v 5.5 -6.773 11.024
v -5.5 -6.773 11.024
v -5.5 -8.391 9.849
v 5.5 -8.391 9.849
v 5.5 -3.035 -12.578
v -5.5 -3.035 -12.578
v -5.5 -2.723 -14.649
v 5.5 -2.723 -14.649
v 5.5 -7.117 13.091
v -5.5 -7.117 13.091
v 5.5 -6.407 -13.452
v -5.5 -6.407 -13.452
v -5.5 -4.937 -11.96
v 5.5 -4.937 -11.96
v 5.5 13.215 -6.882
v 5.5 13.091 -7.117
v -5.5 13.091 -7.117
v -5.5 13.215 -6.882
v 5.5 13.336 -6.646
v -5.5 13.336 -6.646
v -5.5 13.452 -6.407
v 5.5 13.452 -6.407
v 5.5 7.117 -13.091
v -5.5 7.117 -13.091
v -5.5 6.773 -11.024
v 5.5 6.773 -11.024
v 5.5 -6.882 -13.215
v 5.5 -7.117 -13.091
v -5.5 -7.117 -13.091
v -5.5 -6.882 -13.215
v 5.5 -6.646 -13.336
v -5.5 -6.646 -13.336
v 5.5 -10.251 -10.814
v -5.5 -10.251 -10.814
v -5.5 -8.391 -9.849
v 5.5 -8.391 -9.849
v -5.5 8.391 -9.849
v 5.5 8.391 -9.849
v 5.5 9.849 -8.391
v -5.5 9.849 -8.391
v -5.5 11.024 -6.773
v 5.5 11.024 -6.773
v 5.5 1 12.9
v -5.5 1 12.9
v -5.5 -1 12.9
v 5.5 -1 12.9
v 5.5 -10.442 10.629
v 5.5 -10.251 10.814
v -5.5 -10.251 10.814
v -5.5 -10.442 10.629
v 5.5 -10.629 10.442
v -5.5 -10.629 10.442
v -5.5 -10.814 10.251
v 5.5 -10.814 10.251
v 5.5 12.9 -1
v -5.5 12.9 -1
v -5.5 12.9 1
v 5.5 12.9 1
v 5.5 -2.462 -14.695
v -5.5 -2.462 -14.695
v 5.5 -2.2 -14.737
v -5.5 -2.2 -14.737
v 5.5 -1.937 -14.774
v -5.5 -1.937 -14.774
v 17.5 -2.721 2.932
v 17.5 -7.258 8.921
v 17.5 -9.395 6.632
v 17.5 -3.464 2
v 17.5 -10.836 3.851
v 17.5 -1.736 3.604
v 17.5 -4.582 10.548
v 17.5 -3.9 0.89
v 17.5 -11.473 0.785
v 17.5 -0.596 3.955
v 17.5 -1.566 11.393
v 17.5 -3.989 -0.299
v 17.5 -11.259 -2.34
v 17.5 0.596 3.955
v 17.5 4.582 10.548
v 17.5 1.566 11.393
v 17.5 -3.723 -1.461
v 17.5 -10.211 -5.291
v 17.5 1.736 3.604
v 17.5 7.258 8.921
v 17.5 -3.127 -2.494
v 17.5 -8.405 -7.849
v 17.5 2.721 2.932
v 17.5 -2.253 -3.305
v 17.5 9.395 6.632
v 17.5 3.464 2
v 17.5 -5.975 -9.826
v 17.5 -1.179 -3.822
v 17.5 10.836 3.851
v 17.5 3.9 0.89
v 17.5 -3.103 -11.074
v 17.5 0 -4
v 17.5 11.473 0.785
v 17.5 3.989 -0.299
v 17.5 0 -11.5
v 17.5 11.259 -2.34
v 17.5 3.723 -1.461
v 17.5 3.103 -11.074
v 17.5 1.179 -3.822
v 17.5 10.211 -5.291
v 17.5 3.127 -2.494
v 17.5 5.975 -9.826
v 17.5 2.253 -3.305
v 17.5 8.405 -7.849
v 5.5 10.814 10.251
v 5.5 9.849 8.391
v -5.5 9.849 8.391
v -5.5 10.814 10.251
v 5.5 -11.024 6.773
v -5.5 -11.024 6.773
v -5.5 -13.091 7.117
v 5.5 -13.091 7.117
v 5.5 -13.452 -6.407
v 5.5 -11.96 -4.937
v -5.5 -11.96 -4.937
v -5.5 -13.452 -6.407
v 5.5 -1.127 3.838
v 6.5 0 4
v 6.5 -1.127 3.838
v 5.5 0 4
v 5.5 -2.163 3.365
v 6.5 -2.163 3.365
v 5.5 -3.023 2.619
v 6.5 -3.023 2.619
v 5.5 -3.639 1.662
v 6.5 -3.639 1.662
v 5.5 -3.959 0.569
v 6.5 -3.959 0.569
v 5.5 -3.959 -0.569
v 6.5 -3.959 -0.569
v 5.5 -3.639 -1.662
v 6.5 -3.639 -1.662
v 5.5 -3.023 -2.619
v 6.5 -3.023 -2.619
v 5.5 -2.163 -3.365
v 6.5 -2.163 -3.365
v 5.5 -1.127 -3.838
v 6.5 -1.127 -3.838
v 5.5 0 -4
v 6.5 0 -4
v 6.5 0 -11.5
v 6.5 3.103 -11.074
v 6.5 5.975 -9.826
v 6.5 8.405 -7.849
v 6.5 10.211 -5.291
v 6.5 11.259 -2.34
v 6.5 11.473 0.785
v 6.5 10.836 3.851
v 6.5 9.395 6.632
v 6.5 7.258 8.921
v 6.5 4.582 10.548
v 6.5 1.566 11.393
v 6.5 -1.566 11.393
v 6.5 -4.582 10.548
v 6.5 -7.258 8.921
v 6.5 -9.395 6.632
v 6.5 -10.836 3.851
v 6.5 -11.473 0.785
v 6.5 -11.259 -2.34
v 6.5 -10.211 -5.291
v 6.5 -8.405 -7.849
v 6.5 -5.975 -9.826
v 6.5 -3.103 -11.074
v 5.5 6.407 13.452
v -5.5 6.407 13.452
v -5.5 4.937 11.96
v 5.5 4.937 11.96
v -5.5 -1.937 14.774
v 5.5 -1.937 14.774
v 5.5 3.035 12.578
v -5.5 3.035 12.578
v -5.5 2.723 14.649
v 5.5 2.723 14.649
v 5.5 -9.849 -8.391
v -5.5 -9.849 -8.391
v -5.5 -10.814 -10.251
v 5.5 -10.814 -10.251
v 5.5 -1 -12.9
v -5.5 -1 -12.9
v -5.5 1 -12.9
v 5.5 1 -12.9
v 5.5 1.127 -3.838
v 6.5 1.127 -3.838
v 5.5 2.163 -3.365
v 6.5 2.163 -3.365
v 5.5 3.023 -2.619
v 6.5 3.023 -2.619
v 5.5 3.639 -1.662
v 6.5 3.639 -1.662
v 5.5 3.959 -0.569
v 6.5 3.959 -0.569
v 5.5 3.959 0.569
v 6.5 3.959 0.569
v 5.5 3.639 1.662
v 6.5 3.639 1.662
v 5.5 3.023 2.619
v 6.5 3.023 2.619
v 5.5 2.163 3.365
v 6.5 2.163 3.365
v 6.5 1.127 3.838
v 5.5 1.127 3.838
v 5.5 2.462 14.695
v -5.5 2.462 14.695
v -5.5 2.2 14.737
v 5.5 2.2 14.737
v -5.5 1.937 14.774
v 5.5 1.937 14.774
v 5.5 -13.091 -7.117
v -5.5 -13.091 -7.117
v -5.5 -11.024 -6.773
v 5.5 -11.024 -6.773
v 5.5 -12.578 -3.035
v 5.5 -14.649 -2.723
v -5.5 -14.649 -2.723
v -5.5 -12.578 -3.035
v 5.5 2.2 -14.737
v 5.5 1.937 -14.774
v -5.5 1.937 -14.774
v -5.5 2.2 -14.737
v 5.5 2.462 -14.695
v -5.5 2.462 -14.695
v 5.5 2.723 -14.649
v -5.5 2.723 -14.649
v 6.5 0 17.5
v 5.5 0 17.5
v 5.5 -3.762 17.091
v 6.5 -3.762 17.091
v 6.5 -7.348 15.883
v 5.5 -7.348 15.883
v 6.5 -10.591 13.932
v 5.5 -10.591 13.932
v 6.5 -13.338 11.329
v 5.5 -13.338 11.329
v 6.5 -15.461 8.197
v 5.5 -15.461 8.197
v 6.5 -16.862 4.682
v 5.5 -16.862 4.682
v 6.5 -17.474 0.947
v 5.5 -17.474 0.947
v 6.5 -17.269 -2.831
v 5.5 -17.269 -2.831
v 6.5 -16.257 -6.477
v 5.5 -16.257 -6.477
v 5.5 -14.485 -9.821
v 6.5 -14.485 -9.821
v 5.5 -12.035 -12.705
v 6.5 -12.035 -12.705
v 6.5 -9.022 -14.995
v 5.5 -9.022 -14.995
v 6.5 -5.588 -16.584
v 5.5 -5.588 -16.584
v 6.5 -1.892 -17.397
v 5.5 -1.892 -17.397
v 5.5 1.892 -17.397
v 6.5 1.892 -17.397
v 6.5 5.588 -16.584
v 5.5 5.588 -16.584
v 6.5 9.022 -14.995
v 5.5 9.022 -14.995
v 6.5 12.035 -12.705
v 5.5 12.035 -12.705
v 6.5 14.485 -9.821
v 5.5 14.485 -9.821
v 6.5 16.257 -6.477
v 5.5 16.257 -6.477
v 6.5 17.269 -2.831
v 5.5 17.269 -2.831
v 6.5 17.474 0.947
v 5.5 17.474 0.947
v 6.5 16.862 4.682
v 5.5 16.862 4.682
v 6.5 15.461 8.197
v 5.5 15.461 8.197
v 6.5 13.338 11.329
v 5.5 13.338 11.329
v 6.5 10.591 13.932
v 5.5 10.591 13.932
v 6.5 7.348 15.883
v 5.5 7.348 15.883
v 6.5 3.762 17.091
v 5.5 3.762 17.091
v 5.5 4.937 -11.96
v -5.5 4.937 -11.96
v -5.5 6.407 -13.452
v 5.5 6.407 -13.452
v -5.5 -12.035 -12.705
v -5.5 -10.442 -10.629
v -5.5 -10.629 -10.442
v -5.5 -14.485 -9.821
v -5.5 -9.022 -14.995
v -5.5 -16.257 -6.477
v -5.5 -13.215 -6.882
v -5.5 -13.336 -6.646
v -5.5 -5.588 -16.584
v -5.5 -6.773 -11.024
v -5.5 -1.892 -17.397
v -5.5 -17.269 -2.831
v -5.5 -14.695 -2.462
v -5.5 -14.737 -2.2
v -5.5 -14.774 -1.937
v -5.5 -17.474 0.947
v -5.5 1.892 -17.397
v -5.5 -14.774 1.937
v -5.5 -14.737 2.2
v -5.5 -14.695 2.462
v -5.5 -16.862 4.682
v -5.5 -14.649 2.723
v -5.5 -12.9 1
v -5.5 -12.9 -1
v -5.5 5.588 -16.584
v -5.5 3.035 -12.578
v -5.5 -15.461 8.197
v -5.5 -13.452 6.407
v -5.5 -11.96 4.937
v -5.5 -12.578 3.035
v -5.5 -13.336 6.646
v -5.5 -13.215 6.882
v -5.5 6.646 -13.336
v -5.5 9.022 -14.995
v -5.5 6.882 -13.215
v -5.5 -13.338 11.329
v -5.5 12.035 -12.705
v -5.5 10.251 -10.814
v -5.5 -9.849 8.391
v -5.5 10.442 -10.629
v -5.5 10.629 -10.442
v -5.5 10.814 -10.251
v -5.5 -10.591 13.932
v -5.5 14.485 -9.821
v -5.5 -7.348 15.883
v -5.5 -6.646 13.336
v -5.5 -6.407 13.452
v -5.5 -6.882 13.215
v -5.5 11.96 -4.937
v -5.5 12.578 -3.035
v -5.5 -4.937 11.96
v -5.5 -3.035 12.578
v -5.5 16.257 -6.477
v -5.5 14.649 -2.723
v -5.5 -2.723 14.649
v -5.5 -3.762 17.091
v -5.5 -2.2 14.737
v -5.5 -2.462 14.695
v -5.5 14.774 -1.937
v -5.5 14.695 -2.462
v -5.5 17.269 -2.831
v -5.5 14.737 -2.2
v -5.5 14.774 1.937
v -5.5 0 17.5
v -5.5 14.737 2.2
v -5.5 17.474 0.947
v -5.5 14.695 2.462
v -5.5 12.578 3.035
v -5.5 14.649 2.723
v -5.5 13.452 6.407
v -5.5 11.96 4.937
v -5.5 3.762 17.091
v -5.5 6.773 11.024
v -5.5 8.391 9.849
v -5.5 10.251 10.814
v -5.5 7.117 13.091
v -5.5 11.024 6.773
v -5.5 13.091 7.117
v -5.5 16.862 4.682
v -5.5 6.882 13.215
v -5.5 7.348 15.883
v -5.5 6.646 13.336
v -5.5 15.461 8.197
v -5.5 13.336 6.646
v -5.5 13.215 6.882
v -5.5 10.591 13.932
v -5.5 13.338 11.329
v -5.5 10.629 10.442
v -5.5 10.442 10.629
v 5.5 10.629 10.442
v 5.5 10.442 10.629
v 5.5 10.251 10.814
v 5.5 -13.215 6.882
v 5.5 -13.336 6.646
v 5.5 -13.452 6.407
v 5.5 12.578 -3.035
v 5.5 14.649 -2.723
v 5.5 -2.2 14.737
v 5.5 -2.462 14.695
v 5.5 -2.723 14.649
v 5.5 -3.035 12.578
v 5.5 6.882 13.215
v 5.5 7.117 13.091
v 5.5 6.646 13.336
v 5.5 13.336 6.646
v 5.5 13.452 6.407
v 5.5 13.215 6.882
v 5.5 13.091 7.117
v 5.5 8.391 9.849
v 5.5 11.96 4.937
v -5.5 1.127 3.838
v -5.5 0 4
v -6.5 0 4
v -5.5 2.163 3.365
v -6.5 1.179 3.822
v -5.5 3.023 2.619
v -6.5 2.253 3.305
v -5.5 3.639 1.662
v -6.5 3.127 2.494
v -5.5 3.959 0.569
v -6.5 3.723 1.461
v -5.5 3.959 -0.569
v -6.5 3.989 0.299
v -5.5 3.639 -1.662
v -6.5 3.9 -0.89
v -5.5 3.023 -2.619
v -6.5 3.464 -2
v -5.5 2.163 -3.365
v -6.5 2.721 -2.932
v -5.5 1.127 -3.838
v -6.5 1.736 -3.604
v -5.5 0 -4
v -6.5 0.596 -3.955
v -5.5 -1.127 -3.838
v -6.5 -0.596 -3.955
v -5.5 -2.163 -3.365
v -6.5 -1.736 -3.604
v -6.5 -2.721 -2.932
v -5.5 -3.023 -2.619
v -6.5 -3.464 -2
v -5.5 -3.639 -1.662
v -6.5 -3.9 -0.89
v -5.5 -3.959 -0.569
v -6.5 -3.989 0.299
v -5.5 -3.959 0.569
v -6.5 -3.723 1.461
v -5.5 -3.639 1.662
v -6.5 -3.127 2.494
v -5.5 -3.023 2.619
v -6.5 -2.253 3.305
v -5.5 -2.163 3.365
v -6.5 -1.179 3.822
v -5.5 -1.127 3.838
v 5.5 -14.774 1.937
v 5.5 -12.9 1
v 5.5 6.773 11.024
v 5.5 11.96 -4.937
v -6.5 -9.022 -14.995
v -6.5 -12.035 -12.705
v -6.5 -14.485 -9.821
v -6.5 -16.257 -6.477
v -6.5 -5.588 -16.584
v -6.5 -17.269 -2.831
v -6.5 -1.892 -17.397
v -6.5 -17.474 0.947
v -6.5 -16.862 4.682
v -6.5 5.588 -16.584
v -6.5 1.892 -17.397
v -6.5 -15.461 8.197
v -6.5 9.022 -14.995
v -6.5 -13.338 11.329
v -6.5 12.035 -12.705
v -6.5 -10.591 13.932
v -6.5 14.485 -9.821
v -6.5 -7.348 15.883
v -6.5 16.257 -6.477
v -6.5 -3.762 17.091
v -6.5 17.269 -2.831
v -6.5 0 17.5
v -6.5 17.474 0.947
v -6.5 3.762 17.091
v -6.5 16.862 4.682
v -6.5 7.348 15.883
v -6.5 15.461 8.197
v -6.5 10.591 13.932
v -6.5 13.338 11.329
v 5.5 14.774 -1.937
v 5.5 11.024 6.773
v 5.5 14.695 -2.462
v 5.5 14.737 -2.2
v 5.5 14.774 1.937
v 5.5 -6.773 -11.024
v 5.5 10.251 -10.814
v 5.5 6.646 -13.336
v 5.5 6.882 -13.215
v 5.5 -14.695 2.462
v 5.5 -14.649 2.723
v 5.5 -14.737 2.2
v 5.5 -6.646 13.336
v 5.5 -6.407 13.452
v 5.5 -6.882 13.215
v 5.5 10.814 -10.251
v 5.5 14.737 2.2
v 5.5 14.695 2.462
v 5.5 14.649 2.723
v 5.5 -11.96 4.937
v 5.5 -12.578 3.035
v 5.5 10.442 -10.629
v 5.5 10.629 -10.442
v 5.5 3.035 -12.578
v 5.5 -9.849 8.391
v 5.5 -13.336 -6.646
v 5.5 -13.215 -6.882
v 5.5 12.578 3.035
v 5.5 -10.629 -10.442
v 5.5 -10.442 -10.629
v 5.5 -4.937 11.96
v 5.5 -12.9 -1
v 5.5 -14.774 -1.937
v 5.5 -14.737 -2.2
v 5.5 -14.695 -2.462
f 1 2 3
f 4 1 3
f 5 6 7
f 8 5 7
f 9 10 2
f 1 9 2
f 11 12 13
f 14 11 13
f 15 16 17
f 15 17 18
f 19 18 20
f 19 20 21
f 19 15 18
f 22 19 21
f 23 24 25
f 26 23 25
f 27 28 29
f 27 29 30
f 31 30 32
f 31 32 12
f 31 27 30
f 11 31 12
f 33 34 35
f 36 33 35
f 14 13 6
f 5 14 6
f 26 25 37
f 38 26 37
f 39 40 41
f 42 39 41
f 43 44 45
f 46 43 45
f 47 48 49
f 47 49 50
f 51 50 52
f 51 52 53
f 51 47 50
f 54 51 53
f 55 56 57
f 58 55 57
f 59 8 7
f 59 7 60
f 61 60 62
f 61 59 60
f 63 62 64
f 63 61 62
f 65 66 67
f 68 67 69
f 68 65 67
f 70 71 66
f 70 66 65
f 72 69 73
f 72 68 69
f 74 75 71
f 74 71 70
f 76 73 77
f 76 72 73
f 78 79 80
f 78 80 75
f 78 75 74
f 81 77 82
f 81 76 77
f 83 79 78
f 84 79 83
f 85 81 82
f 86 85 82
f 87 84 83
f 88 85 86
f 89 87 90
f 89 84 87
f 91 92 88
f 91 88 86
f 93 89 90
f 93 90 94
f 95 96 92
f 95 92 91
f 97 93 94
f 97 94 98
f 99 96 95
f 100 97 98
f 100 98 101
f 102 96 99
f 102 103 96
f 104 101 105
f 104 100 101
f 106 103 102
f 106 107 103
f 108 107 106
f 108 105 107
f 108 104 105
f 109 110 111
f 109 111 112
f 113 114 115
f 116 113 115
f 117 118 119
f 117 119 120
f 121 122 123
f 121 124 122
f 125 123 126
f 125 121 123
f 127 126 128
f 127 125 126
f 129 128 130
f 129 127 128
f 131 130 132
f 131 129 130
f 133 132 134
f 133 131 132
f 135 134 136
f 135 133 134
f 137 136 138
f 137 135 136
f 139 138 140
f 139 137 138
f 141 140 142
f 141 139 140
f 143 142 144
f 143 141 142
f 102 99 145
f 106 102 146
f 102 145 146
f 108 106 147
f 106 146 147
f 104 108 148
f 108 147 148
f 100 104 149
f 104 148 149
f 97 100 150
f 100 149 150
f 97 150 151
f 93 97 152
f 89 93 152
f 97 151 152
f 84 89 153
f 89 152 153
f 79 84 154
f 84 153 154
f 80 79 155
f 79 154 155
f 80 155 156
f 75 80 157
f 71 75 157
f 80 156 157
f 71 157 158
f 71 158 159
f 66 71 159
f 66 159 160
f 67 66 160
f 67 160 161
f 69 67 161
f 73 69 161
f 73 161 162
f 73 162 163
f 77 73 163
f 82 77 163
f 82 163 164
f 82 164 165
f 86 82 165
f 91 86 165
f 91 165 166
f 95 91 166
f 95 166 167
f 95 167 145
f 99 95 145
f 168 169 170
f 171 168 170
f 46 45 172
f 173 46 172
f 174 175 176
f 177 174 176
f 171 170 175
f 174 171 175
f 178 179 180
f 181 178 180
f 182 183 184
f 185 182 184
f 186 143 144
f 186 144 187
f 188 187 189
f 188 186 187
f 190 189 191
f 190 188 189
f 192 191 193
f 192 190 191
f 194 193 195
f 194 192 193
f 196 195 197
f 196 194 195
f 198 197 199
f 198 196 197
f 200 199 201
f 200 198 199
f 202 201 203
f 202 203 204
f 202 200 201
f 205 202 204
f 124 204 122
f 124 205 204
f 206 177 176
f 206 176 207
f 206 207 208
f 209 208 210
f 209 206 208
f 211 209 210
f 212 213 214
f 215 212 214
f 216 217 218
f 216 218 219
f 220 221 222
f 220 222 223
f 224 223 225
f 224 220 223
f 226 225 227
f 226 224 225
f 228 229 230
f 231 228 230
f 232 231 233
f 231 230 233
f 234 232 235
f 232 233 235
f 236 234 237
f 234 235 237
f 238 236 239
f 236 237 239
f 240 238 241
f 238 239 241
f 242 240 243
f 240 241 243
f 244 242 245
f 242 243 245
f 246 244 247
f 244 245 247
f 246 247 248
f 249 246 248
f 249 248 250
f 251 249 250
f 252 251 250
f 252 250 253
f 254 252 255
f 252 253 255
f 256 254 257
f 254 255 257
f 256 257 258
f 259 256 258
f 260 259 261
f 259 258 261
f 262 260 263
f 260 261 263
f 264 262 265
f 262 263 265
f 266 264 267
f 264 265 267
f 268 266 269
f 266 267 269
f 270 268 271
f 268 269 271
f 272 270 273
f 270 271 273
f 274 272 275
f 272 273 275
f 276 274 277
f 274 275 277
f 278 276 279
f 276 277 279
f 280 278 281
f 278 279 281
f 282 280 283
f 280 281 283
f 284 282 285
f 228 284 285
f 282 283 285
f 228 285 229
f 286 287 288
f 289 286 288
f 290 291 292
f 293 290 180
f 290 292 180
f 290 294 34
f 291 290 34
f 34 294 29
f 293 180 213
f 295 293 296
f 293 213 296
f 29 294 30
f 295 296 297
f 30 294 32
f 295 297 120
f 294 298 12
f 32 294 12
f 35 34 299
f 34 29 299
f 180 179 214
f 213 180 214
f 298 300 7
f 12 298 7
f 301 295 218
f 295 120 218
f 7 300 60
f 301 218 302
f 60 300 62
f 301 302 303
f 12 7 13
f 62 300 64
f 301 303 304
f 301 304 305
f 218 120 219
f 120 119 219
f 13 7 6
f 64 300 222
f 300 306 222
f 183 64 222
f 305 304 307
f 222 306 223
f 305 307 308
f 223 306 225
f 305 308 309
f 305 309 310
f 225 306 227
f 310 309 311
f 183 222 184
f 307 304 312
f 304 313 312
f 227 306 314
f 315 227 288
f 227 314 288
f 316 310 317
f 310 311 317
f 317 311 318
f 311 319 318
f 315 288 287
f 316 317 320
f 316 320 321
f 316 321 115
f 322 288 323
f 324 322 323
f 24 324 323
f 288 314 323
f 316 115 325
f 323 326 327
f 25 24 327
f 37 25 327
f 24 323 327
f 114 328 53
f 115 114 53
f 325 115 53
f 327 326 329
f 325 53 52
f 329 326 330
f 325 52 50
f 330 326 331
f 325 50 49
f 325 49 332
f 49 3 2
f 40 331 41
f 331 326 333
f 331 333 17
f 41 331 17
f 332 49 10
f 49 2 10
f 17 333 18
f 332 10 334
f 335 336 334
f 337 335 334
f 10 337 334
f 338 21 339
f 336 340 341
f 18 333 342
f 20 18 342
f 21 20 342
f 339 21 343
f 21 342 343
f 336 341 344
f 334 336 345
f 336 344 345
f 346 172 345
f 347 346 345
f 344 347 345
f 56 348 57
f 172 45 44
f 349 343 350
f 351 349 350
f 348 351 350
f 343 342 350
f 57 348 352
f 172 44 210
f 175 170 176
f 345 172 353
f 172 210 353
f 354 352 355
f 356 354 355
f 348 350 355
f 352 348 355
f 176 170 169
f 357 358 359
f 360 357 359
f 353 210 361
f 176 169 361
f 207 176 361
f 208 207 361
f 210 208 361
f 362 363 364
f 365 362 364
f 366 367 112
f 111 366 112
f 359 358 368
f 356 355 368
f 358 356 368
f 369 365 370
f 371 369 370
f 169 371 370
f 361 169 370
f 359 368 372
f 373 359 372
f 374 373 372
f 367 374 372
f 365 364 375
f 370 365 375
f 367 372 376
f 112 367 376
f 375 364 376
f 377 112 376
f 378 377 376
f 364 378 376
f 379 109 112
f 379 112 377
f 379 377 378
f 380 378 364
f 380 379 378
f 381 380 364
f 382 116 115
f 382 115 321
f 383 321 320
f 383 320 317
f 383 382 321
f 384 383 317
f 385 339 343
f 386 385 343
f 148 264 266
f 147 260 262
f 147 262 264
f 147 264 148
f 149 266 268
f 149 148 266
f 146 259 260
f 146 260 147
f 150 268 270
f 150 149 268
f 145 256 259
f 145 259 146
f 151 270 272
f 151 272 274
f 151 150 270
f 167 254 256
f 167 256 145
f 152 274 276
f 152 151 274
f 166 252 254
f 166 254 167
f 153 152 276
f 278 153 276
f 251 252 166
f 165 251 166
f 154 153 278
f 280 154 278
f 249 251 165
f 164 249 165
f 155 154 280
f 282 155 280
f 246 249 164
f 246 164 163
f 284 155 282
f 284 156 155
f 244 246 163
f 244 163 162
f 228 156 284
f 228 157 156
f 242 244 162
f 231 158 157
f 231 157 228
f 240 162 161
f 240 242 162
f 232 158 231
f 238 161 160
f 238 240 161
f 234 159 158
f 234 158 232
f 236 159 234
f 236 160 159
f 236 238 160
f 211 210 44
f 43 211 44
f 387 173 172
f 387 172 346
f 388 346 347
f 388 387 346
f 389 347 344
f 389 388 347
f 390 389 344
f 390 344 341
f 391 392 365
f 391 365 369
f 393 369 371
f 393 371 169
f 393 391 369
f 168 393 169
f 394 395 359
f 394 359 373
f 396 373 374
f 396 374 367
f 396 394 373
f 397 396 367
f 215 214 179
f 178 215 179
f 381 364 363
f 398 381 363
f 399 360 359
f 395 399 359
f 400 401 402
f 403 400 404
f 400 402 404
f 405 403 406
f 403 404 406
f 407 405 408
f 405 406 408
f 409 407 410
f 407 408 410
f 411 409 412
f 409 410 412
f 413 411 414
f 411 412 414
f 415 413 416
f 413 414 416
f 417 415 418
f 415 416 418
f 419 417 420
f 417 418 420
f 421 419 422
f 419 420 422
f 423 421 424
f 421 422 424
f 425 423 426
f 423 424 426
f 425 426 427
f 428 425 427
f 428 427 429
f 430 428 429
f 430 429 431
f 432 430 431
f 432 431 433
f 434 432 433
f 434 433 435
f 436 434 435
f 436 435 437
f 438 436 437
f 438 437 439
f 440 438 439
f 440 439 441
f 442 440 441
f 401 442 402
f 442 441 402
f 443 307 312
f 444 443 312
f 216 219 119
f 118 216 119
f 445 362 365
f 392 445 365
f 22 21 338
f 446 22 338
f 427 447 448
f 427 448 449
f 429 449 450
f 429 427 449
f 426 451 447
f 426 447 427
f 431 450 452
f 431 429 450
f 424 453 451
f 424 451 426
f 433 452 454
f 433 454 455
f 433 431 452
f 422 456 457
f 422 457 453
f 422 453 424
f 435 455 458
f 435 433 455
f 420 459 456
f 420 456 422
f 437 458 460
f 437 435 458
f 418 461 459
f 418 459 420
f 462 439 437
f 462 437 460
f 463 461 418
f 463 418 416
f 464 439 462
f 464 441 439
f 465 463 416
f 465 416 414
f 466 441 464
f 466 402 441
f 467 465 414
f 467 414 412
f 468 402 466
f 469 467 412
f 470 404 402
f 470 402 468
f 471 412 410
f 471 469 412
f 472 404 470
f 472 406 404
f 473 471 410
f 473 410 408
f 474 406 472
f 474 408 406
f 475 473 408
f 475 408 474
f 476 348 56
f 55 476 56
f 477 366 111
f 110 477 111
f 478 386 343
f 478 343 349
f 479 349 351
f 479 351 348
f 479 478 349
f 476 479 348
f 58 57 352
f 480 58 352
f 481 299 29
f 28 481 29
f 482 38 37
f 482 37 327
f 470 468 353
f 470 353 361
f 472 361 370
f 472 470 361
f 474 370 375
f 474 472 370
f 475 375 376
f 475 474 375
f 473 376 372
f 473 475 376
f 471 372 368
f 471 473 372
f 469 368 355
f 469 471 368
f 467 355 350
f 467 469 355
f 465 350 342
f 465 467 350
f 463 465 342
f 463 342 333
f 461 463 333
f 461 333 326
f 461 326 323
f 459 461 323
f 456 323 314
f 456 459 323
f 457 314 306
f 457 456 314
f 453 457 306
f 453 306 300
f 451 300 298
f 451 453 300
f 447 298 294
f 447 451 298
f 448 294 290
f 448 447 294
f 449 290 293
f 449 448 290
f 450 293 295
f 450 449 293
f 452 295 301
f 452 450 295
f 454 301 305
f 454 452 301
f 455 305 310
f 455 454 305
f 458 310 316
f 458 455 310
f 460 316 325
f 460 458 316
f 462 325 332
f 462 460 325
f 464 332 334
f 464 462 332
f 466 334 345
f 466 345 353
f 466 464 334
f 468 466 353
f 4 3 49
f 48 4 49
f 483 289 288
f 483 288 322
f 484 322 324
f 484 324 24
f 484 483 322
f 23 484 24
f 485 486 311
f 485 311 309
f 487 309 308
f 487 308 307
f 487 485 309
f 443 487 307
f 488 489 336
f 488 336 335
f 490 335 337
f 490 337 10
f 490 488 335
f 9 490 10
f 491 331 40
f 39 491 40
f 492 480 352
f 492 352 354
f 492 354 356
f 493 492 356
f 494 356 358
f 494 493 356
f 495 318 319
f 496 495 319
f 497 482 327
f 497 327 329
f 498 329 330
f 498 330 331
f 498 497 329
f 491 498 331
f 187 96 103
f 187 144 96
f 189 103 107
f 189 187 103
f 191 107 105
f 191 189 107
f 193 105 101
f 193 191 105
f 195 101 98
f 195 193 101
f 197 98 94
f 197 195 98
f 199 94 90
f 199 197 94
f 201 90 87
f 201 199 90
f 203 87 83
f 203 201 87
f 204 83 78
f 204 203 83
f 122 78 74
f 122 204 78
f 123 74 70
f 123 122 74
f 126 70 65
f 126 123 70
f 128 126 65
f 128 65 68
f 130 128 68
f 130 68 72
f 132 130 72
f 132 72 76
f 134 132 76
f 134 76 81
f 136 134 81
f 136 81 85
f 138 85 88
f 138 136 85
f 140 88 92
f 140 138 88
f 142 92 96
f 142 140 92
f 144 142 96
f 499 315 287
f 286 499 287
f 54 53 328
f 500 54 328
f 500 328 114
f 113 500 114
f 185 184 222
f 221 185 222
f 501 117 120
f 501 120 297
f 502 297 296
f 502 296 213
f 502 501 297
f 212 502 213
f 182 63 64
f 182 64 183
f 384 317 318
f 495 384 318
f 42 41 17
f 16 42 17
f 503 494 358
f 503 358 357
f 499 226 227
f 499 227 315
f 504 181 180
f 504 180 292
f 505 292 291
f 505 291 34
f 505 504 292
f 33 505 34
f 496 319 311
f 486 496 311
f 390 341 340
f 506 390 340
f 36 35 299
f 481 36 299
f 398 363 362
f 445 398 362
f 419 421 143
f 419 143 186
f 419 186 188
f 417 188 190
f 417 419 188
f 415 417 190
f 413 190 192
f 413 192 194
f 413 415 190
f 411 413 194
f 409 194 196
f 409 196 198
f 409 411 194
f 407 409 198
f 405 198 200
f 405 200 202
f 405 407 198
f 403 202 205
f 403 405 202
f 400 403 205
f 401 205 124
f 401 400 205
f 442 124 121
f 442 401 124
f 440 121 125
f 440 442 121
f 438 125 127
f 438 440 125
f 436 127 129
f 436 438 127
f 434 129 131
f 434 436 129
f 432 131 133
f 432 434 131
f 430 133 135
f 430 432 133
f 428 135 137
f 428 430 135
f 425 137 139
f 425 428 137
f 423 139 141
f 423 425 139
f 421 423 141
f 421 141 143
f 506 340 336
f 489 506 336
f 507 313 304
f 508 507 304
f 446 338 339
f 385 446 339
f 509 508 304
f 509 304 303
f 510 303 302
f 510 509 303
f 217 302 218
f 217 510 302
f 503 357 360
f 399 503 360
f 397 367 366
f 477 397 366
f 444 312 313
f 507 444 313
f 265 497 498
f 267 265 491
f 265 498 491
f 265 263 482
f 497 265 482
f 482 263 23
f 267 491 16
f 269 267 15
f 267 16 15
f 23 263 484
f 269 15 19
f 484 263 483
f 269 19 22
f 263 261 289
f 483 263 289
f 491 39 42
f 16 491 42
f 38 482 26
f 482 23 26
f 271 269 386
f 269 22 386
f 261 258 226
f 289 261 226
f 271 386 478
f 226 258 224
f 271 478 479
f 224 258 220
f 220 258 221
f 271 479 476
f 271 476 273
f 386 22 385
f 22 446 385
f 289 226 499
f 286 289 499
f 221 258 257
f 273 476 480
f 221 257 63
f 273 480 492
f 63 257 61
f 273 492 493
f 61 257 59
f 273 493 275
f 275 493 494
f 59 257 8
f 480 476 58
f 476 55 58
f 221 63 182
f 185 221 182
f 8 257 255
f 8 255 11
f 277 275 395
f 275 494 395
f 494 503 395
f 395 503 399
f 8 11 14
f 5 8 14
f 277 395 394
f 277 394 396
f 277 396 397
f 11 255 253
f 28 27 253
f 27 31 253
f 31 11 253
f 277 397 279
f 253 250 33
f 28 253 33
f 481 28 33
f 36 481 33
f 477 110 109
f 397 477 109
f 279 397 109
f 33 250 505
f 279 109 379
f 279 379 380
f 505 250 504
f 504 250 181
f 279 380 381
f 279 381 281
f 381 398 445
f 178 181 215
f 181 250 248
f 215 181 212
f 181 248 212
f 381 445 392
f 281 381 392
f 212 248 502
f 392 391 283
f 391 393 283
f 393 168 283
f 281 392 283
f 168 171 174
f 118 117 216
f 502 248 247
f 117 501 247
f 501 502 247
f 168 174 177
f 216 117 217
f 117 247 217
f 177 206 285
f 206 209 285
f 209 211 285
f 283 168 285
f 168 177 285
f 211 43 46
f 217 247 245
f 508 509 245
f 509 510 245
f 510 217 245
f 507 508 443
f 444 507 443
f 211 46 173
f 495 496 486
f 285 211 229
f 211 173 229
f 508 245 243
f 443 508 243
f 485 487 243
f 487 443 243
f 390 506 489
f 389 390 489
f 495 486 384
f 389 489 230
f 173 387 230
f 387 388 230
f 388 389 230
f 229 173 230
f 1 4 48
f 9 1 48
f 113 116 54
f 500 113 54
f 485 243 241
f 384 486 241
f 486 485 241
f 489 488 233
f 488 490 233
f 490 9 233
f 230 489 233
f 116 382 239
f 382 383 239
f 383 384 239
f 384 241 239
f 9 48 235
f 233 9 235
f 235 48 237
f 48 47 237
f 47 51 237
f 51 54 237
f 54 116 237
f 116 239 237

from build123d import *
from build123d.topology import SkipClean

# Parameters (mm, degrees)
SKETCH1_R           = 14.9
SKETCH1_R_2         = 4
BOSS_EXTRUDE1_DEPTH = 5.5
SKETCH2_R           = 11.5
SKETCH2_R_2         = 4
BOSS_EXTRUDE2_DEPTH = 12
CUT_EXTRUDE2_DEPTH  = 11
CIRPATTERN2_COUNT   = 20
BOSS_EXTRUDE3_START = 1
SKETCH7_R           = 17.5
SKETCH7_R_2         = 4
BOSS_EXTRUDE3_DEPTH = 1
SKETCH8_R           = 17.5
SKETCH8_R_2         = 4
BOSS_EXTRUDE4_DEPTH = 1


with BuildPart() as part:
    # Sketch1 → Boss-Extrude1 (new, symmetric)
    with BuildSketch(Plane(origin=(0, 0, 0), x_dir=(0, 0, -1), z_dir=(1, 0, 0))):
        Circle(SKETCH1_R)
        Circle(SKETCH1_R_2, mode=Mode.SUBTRACT)
    extrude(amount=BOSS_EXTRUDE1_DEPTH, both=True)

    # Sketch2 → Boss-Extrude2 (add)
    with BuildSketch(Plane(origin=(5.5, 0, 0), x_dir=(0, 0, -1), z_dir=(1, 0, 0))):
        Circle(SKETCH2_R)
        Circle(SKETCH2_R_2, mode=Mode.SUBTRACT)
    extrude(amount=BOSS_EXTRUDE2_DEPTH)

    # Sketch6 → Cut-Extrude2 (cut)
    with BuildSketch(Plane.ZY.offset(5.5)):
        Polygon((-1, 12.9), (1, 12.9), (2, 14.9), (-2, 14.9), align=None)
    cut_extrude2 = extrude(amount=-CUT_EXTRUDE2_DEPTH, mode=Mode.SUBTRACT)

    # CirPattern2: Cut-Extrude2 ×20 about axis
    cirpattern2_axis = Axis((0, 0, 0), (1, 0, 0))
    for i in range(1, CIRPATTERN2_COUNT):
        add(cut_extrude2.rotate(cirpattern2_axis, i * 360 / CIRPATTERN2_COUNT), mode=Mode.SUBTRACT)

    # Sketch7 → Boss-Extrude3 (add)
    with SkipClean():  # the faces are left unmerged after this step: merging them gives an invalid solid
        with BuildSketch(Plane.ZY.offset(5.5).offset(BOSS_EXTRUDE3_START)):
            Circle(SKETCH7_R)
            Circle(SKETCH7_R_2, mode=Mode.SUBTRACT)
        extrude(amount=-BOSS_EXTRUDE3_DEPTH)

    # Sketch8 → Boss-Extrude4 (add)
    with SkipClean():  # the faces are left unmerged after this step: merging them gives an invalid solid
        with BuildSketch(Plane(origin=(5.5, 0, 0), x_dir=(0, 0, -1), z_dir=(1, 0, 0))):
            with Locations(Location((0, 0, 0), (0, 0, 180))):
                Circle(SKETCH8_R)
            with Locations(Location((0, 0, 0), (0, 0, 180))):
                Circle(SKETCH8_R_2, mode=Mode.SUBTRACT)
        extrude(amount=BOSS_EXTRUDE4_DEPTH)
    add(part.part.scale(1), mode=Mode.REPLACE)  # the faces are merged on a copy


solid = part.part
